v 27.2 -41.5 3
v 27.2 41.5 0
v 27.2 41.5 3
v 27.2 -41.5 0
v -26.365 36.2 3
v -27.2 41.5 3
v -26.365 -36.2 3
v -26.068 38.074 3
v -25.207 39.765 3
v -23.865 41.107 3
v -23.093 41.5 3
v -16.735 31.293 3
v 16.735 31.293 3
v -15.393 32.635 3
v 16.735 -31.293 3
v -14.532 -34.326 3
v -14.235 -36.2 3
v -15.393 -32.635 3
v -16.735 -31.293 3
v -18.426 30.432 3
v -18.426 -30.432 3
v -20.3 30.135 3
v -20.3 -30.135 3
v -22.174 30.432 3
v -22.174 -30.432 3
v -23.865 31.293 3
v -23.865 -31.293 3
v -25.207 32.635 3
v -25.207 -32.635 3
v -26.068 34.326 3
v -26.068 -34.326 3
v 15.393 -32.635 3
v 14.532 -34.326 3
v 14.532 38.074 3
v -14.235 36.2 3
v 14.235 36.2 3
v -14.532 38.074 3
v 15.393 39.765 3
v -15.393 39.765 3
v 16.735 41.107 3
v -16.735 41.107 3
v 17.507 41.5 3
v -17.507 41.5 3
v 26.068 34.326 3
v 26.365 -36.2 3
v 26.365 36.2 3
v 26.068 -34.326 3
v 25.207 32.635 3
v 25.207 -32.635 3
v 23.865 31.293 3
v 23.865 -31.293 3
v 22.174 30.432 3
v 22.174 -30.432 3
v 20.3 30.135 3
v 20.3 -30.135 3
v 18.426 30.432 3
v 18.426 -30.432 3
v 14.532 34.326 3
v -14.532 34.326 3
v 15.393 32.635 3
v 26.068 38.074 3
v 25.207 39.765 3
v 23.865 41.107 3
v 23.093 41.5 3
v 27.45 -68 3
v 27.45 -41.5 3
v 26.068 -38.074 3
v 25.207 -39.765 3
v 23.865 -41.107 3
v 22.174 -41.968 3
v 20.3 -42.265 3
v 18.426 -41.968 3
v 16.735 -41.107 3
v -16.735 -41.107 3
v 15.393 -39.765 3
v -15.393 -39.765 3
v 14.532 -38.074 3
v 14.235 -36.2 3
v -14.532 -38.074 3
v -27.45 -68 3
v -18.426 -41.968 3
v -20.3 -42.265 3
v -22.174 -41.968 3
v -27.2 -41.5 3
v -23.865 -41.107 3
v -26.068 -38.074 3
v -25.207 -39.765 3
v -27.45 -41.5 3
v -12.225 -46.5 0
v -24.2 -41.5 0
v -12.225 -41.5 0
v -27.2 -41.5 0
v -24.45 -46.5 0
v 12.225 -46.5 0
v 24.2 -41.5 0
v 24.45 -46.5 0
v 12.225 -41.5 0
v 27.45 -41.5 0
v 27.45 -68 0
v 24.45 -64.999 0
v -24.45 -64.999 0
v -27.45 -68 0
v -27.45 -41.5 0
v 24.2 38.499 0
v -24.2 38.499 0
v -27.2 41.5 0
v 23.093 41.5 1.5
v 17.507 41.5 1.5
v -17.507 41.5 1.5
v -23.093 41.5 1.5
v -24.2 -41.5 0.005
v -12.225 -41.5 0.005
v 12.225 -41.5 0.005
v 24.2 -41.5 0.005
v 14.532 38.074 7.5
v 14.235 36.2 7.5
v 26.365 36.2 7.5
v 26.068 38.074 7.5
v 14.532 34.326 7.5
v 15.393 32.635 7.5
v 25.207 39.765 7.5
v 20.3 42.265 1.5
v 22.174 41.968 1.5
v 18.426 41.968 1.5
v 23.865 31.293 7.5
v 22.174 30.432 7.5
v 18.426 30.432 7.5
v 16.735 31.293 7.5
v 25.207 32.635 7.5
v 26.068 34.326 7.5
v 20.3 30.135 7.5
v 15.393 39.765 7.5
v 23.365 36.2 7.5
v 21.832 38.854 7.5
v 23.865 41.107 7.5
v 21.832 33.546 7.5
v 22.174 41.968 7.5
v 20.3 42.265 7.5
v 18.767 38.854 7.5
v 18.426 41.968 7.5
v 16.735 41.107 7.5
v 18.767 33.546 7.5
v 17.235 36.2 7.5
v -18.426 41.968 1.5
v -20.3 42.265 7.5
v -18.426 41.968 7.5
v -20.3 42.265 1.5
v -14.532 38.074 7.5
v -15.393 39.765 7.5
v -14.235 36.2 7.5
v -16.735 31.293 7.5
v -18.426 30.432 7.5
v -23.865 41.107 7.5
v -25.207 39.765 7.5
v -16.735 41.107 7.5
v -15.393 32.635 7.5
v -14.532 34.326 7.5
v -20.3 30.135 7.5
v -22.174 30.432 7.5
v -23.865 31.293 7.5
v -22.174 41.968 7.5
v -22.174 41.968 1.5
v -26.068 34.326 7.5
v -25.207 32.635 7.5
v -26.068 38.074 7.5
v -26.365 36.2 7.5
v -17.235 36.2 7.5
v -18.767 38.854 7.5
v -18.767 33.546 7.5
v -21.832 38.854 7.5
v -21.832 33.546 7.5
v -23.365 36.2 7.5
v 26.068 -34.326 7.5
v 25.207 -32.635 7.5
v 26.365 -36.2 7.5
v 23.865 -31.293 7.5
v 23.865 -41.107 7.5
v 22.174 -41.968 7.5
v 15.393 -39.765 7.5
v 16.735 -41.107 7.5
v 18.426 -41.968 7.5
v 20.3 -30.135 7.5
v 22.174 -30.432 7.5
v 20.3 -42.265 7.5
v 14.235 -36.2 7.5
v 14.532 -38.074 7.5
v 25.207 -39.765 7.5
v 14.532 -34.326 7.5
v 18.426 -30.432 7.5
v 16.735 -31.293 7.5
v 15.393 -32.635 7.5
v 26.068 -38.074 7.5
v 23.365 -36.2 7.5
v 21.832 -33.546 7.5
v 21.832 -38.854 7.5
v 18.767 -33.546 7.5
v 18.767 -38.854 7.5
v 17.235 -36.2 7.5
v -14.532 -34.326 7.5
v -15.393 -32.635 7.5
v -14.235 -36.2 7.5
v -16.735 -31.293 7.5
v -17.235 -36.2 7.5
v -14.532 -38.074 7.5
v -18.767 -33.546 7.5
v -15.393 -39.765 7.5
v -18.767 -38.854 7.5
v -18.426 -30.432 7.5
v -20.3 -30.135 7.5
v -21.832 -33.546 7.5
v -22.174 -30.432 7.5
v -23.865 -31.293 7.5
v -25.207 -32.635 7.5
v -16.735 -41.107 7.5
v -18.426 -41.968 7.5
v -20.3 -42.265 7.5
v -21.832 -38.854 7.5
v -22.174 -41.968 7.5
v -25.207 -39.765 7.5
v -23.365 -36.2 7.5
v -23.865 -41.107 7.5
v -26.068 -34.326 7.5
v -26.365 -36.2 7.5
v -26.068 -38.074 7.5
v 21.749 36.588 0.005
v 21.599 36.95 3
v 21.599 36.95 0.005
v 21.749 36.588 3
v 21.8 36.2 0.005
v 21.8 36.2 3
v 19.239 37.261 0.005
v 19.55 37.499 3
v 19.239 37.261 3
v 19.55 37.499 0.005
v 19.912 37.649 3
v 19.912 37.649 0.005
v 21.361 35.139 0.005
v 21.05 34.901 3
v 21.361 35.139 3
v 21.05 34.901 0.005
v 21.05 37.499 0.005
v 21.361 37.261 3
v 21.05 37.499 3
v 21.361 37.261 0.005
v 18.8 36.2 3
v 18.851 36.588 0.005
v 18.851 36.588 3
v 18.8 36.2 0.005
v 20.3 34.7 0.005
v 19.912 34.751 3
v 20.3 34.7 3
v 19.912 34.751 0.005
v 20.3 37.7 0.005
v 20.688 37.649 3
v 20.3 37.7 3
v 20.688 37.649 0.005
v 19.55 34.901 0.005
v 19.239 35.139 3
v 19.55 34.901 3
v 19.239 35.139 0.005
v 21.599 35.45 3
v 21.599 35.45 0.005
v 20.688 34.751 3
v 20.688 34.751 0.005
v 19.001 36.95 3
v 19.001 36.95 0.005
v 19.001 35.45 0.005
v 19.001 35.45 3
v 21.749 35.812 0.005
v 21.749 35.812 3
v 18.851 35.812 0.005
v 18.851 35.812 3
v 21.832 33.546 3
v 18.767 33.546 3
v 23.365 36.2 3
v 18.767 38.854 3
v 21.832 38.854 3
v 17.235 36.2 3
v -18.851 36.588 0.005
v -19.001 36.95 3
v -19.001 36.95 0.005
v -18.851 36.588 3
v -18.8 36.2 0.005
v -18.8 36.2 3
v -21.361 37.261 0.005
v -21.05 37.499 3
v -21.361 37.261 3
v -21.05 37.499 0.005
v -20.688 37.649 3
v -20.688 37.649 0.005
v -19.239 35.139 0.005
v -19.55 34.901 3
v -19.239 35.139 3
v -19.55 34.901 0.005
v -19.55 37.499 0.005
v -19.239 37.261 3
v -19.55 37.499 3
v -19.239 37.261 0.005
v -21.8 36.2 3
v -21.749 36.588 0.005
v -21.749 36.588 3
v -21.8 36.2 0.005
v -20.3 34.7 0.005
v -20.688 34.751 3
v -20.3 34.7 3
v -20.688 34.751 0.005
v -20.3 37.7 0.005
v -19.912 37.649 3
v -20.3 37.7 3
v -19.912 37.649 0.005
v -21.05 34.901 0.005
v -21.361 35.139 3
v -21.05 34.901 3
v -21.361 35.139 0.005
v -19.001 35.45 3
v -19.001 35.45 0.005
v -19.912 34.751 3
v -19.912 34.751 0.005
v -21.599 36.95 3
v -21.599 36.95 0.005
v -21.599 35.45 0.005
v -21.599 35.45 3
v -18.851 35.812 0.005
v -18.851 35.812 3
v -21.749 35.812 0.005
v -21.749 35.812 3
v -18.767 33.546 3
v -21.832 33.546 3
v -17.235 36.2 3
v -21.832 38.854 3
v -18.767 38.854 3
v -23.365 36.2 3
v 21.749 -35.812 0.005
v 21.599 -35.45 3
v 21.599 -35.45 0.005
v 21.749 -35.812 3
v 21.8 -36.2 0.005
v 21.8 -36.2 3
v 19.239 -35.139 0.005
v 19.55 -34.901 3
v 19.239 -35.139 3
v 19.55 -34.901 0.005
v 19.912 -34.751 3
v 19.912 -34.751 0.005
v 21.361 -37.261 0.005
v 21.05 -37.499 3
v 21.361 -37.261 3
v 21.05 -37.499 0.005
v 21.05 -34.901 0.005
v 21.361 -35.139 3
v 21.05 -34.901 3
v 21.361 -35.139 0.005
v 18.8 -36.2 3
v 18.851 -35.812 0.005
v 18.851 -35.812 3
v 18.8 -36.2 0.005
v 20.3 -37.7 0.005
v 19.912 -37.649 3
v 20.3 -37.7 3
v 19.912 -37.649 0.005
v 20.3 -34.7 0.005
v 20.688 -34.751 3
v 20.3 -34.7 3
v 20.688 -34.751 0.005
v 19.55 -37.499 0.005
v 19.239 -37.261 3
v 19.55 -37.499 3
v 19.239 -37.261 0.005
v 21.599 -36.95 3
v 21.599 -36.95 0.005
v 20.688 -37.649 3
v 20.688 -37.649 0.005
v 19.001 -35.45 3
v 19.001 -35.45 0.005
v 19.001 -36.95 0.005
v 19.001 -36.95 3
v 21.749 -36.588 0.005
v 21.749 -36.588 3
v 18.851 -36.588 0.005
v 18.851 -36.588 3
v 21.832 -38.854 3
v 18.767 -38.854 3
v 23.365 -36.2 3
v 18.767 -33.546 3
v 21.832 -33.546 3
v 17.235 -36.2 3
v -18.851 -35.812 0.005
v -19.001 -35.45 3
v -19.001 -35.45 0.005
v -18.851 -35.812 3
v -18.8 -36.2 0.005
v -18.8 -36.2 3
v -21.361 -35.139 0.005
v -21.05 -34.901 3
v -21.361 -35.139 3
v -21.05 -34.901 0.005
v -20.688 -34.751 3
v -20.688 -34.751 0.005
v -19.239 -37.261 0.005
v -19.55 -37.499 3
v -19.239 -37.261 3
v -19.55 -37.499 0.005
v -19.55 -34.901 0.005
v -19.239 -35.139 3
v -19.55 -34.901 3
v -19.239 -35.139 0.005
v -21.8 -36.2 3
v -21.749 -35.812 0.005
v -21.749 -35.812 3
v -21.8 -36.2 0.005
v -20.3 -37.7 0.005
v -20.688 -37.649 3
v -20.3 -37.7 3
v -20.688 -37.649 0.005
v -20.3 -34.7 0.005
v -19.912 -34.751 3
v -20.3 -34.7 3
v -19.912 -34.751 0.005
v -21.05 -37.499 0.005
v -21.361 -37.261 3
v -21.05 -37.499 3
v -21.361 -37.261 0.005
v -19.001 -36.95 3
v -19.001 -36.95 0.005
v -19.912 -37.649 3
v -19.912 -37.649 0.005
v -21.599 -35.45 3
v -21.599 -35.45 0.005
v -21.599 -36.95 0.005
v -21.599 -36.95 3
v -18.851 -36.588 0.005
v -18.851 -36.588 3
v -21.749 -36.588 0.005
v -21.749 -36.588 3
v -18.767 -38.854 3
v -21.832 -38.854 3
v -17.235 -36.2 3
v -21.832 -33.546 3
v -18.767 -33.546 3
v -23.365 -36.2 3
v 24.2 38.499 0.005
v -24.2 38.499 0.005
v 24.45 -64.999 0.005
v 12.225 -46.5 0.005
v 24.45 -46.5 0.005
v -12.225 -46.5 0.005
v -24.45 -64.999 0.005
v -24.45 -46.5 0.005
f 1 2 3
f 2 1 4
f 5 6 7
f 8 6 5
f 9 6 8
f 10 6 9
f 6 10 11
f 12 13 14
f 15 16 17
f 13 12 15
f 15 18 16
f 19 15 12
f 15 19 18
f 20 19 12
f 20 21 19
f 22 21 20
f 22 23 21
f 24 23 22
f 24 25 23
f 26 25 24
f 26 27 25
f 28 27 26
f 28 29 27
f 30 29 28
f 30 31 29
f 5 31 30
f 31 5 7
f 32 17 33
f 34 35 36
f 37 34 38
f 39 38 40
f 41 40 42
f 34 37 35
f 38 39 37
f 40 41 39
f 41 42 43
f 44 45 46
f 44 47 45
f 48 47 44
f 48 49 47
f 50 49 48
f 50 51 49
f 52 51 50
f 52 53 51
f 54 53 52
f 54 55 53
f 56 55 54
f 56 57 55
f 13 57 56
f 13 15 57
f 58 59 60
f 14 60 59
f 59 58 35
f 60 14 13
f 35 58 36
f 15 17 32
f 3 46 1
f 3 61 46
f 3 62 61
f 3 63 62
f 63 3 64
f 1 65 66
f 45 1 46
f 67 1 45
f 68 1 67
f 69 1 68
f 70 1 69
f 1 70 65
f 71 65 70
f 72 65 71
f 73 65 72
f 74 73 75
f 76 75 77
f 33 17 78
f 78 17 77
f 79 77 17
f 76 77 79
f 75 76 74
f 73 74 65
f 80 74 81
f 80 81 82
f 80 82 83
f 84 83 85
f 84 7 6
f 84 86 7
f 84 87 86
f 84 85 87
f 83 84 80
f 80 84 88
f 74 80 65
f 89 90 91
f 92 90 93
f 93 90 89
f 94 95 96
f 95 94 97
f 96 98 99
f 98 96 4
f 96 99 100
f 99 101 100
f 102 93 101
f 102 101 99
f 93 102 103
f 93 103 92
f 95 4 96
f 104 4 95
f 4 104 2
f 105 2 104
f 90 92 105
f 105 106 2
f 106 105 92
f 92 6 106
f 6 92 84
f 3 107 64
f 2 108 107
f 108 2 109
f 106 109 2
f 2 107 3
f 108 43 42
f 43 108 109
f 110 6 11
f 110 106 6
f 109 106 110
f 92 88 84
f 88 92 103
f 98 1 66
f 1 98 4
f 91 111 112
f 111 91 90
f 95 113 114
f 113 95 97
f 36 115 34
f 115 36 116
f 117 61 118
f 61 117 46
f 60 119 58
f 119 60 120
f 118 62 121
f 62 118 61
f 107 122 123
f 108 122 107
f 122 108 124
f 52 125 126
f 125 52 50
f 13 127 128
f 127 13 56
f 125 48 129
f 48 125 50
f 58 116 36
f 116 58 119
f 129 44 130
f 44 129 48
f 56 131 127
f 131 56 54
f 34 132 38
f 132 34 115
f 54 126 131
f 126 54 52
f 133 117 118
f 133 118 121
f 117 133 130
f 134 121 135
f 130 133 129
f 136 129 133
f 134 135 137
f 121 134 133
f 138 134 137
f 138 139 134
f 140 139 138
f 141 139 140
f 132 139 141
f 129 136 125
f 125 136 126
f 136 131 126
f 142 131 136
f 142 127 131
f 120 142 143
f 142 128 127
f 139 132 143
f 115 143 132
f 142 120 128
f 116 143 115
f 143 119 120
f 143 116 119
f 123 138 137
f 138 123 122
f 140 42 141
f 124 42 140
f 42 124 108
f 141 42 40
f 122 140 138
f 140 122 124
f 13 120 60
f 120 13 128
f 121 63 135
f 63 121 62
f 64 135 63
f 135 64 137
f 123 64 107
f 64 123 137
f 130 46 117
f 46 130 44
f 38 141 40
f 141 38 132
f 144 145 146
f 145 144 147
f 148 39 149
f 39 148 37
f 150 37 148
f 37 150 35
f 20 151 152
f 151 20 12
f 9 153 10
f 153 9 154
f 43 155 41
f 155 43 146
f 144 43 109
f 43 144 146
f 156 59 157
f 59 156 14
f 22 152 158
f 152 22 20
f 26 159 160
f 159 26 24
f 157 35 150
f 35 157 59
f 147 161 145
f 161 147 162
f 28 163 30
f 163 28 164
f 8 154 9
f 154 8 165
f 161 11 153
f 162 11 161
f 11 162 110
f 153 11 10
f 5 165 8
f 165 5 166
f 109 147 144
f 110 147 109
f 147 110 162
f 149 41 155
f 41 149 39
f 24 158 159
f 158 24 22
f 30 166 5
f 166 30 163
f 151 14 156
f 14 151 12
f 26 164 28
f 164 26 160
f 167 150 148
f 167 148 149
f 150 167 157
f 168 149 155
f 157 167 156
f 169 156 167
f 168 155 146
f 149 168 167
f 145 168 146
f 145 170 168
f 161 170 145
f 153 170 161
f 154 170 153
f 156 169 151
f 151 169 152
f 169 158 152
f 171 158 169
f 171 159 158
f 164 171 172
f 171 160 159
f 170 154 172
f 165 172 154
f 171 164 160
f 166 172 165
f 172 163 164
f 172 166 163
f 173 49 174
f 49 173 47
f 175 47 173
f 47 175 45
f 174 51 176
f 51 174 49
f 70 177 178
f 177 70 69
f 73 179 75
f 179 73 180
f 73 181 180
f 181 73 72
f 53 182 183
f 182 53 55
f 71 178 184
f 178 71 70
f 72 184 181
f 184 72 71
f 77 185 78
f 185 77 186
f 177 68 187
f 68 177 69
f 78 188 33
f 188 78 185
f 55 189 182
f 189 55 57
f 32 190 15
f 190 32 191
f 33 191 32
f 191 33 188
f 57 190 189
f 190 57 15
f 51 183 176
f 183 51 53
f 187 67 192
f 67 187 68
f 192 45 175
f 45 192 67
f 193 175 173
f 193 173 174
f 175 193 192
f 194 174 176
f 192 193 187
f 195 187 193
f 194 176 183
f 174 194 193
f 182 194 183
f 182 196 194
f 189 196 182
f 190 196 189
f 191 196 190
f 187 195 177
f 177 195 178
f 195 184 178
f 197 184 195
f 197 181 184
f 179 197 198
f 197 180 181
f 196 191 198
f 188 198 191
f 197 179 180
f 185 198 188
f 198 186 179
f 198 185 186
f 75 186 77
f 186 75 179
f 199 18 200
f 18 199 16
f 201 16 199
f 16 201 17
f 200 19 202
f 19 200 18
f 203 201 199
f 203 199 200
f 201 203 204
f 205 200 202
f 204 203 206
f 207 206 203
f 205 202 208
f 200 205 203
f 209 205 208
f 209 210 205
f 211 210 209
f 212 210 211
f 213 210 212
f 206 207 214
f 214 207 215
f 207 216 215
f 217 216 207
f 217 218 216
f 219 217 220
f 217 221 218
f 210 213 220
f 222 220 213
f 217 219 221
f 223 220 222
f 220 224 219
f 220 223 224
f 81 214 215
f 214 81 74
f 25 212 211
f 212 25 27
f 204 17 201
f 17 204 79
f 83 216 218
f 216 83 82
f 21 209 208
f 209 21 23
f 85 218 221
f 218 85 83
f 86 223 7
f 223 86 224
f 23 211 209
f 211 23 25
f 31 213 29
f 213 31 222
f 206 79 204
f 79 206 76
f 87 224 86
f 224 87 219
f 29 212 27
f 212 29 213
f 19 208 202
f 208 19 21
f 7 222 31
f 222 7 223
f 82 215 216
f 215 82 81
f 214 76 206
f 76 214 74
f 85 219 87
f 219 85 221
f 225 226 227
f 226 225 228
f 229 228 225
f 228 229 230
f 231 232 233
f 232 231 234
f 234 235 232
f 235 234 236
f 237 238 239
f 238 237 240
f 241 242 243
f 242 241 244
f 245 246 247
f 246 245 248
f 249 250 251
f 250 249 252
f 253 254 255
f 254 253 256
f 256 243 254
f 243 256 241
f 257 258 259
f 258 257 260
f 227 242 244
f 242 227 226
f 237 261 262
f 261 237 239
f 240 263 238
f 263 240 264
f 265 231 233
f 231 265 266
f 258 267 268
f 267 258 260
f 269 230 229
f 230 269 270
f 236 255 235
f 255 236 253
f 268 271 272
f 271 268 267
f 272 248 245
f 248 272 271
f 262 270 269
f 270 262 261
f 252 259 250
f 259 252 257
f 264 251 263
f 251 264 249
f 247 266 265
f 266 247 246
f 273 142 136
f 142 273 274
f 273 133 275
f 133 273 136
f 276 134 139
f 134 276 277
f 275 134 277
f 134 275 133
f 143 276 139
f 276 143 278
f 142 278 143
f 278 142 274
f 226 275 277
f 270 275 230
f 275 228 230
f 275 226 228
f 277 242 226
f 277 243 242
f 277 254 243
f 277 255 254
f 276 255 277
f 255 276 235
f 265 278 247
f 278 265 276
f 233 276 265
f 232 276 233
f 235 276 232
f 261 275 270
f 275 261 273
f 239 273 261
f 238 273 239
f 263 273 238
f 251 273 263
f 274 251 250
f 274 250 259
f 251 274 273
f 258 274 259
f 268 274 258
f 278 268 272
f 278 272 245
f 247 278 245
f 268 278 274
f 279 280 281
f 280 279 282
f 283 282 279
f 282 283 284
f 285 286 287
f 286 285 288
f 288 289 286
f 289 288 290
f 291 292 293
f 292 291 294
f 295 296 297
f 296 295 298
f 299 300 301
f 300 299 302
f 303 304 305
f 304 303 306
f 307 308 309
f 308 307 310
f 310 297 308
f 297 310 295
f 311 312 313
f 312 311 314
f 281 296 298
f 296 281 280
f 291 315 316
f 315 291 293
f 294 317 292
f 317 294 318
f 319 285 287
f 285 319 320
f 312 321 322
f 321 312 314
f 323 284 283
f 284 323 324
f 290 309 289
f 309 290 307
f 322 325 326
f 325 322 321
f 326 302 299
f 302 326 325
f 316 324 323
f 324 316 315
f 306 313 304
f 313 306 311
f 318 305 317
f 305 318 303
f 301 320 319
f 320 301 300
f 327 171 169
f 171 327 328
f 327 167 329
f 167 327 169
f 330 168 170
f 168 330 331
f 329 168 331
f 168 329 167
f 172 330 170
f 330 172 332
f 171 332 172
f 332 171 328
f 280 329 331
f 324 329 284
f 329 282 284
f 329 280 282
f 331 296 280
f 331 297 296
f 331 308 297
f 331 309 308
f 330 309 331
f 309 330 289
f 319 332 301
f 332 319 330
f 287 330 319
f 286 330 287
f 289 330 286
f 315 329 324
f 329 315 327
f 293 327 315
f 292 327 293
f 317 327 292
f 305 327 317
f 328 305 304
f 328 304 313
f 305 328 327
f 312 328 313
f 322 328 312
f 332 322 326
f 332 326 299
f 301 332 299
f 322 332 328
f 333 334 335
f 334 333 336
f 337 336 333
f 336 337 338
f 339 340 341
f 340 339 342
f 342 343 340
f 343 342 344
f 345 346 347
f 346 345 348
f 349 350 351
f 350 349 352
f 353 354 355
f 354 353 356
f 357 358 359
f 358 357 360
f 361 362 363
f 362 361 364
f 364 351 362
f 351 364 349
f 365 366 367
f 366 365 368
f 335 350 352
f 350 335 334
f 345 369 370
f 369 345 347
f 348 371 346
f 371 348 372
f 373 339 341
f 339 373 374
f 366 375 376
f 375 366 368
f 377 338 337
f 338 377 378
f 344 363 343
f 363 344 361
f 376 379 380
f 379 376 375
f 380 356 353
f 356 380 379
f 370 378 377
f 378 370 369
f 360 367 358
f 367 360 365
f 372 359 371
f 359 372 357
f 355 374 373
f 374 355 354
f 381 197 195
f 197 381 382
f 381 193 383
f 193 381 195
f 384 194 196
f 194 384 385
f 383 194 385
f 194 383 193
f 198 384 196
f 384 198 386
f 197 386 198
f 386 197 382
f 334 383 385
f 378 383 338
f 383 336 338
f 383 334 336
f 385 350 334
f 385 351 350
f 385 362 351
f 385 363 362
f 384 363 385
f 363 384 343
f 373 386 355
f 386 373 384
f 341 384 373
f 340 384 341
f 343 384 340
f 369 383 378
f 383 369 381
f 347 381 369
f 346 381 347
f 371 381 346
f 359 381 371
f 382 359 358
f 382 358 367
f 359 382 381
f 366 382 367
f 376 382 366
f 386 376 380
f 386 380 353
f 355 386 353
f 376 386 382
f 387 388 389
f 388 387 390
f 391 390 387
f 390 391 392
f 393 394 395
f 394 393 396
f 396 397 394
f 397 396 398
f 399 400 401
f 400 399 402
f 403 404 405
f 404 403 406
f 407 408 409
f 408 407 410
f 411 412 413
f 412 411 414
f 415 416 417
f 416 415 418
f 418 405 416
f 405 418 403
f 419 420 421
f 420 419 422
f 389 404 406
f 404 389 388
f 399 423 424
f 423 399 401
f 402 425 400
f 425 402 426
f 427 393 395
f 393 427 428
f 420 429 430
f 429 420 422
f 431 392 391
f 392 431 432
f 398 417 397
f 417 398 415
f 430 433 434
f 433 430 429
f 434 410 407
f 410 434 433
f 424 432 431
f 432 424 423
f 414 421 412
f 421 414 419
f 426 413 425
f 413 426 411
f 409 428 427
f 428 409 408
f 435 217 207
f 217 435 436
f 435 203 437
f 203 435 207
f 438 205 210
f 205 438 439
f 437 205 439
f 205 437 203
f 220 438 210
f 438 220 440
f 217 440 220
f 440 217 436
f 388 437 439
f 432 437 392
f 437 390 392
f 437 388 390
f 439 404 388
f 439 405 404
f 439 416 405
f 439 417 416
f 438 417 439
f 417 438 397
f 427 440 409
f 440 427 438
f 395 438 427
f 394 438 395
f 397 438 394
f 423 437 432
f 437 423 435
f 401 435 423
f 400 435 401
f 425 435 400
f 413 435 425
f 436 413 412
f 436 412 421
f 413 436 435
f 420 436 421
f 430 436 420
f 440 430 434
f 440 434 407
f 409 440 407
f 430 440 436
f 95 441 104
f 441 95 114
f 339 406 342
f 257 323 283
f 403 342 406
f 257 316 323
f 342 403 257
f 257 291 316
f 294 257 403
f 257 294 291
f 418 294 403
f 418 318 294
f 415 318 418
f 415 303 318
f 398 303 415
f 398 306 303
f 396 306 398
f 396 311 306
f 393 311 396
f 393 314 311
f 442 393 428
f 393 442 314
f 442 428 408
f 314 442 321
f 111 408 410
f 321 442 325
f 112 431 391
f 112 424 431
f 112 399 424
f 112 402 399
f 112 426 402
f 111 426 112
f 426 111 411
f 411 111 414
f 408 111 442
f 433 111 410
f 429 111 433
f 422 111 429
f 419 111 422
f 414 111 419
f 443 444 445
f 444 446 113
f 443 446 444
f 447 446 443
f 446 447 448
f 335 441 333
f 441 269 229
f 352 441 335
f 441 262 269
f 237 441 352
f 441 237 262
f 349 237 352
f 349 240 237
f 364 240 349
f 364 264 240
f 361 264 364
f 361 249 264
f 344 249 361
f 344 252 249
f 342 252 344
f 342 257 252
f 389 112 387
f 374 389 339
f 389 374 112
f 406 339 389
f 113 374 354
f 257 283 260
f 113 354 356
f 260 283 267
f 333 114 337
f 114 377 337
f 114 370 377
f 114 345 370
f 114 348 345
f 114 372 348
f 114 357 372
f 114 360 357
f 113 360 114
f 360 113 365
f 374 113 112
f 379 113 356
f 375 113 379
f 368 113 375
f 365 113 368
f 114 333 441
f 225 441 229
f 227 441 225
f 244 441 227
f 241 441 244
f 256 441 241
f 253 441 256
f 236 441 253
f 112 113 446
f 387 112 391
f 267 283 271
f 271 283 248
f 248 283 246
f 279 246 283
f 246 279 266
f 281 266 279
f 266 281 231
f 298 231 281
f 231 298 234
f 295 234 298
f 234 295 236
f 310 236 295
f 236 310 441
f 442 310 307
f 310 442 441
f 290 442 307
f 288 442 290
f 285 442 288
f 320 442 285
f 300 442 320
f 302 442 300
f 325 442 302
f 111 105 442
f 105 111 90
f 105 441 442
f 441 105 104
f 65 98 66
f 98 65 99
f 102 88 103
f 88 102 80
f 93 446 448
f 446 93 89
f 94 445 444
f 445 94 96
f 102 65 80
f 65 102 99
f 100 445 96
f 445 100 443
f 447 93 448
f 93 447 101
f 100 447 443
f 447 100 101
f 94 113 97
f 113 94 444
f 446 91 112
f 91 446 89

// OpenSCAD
viewSelection = 4;
thickness = 3;
keypadWidth = 48.4;
keypadLength = 80;
keypadButtonWidth = 45;
keypadButtonLength = 61;
keypadButtonOffset = 2;
keypadBoltHoleWidthOffset = 40.6;
keypadBoltHoleLengthOffset = 72.4;
//cavityDepth = 7.5;
cavityDepth = 0;
keypadBoltHoleDiameter = 3;
ArduinoWidth = keypadWidth+0.5;
ArduinoLength = 18.5;
ArduinoThickness = 8;
USBPortWidth = 11;
PCBSeparation = 5;
boltDiameter = 3;
boltHeadDiameter = 6;
nutMajorDiameter = 6.13;

nutMajorRadius = nutMajorDiameter/2;
keypadBoltHoleRadius = keypadBoltHoleDiameter /2;
boltRadius = boltDiameter/2;
boltHeadRadius = boltHeadDiameter/2;
//$vpr=[55,180,25-360*$t];

if(viewSelection==4){
    bottom();
}

if(viewSelection==3){
    ArduinoCover();
}

if(viewSelection==2){
    accessibleTop();
}

if(viewSelection==1){
    plainLid();
}

if(viewSelection==0){
    color("aqua"){
        accessibleTop();
        translate([0,-(keypadLength/2)-ArduinoLength/2-thickness-PCBSeparation,0]){
            ArduinoCover();
        }
        translate([0,-(keypadLength/2)-thickness/2-PCBSeparation/2,0]){
            joiningTunnel();
        }
    }
    translate([0,0,0]){
        color("lime"){
            bottom();
        }
    }
}

module bottom(){
    KBBottom();
    translate([0,-(keypadLength/2)-ArduinoLength/2-thickness-PCBSeparation,0]){
        ArduinoCover();
    }
    translate([0,-(keypadLength/2)-thickness/2-PCBSeparation/2,0]){
        joiningTunnel();
    }
}

module KBBottom(){
    difference(){
        translate([0,0,(cavityDepth+thickness)/2]){
            cube([keypadWidth+thickness*2, keypadLength+thickness, cavityDepth+thickness], center=true);
            translate([keypadBoltHoleWidthOffset/2, keypadBoltHoleLengthOffset/2, 0]){
                cylinder(thickness*2, nutMajorRadius+thickness, nutMajorRadius+thickness);
            }
            translate([-keypadBoltHoleWidthOffset/2, keypadBoltHoleLengthOffset/2, 0]){
                cylinder(thickness*2, nutMajorRadius+thickness, nutMajorRadius+thickness);
            }
            translate([keypadBoltHoleWidthOffset/2, -keypadBoltHoleLengthOffset/2, 0]){
                cylinder(thickness*2, nutMajorRadius+thickness, nutMajorRadius+thickness);
            }
            translate([-keypadBoltHoleWidthOffset/2, -keypadBoltHoleLengthOffset/2, 0]){
                cylinder(thickness*2, nutMajorRadius+thickness, nutMajorRadius+thickness);
            }
        }
        translate([0,-thickness/2-0.001,(cavityDepth)/2]){
            cube([keypadWidth, keypadLength, cavityDepth+0.01], center=true);
        }
        translate([keypadBoltHoleWidthOffset/2, keypadBoltHoleLengthOffset/2, 0]){
            nutSocket();
        }
        translate([-keypadBoltHoleWidthOffset/2, keypadBoltHoleLengthOffset/2, 0]){
            nutSocket();
        }
        translate([keypadBoltHoleWidthOffset/2, -keypadBoltHoleLengthOffset/2, 0]){
            nutSocket();
        }
        translate([-keypadBoltHoleWidthOffset/2, -keypadBoltHoleLengthOffset/2, 0]){
            nutSocket();
        }
    }
}

module joiningTunnel(){
    difference(){
        translate([0,0,(cavityDepth+thickness)/2]){
            cube([ArduinoWidth+thickness*2, PCBSeparation, cavityDepth+thickness], center=true);
        }
        translate([0,thickness/2+0.001,(cavityDepth)/2]){
            cube([ArduinoWidth/2, ArduinoLength, cavityDepth+0.01], center=true);
        }
    }
}

module ArduinoCover(){
    difference(){
        translate([0,0,(cavityDepth+thickness)/2]){
            cube([ArduinoWidth+thickness*2, ArduinoLength+thickness, cavityDepth+thickness], center=true);
        }
        translate([0,thickness/2+0.001,(cavityDepth)/2]){
            cube([ArduinoWidth, ArduinoLength, cavityDepth+0.01], center=true);
        }
        translate([ArduinoWidth/2+thickness/2,thickness/2,(cavityDepth)/2]){
            cube([thickness*1.01, USBPortWidth, cavityDepth*4], center=true);
        }
    }
}

module plainLid(){
    difference(){
        translate([0,0,(cavityDepth+thickness)/2]){
            cube([keypadWidth+thickness*2, keypadLength+thickness, cavityDepth+thickness], center=true);
        }
        translate([0,-thickness/2-0.001,(cavityDepth)/2]){
            cube([keypadWidth, keypadLength, cavityDepth+0.01], center=true);
        }
        translate([keypadBoltHoleWidthOffset/2, keypadBoltHoleLengthOffset/2, 0]){
            bolt();
        }
        translate([-keypadBoltHoleWidthOffset/2, keypadBoltHoleLengthOffset/2, 0]){
            bolt();
        }
        translate([keypadBoltHoleWidthOffset/2, -keypadBoltHoleLengthOffset/2, 0]){
            bolt();
            }
        translate([-keypadBoltHoleWidthOffset/2, -keypadBoltHoleLengthOffset/2, 0]){
            bolt();
        }
    }
}

module accessibleTop(){
    difference(){
        plainLid();
        translate([0,keypadButtonOffset,0]){
            cube([keypadButtonWidth, keypadButtonLength, cavityDepth*3],center=true);
        }
    }
}

module bolt(){
    cylinder(cavityDepth*5, boltRadius, boltRadius, center=true, $fn = 24);
    translate([0,0,cavityDepth+thickness/2]){
        cylinder(thickness+0.01, boltRadius, boltHeadRadius, center=true, $fn = 24);
    }
}

module nutSocket(){
    cylinder(thickness*5, boltRadius, boltRadius, center=true, $fn = 24);
    translate([0,0,cavityDepth+thickness]){
        cylinder(thickness*3, nutMajorRadius, nutMajorRadius, $fn = 6);
    }
}
